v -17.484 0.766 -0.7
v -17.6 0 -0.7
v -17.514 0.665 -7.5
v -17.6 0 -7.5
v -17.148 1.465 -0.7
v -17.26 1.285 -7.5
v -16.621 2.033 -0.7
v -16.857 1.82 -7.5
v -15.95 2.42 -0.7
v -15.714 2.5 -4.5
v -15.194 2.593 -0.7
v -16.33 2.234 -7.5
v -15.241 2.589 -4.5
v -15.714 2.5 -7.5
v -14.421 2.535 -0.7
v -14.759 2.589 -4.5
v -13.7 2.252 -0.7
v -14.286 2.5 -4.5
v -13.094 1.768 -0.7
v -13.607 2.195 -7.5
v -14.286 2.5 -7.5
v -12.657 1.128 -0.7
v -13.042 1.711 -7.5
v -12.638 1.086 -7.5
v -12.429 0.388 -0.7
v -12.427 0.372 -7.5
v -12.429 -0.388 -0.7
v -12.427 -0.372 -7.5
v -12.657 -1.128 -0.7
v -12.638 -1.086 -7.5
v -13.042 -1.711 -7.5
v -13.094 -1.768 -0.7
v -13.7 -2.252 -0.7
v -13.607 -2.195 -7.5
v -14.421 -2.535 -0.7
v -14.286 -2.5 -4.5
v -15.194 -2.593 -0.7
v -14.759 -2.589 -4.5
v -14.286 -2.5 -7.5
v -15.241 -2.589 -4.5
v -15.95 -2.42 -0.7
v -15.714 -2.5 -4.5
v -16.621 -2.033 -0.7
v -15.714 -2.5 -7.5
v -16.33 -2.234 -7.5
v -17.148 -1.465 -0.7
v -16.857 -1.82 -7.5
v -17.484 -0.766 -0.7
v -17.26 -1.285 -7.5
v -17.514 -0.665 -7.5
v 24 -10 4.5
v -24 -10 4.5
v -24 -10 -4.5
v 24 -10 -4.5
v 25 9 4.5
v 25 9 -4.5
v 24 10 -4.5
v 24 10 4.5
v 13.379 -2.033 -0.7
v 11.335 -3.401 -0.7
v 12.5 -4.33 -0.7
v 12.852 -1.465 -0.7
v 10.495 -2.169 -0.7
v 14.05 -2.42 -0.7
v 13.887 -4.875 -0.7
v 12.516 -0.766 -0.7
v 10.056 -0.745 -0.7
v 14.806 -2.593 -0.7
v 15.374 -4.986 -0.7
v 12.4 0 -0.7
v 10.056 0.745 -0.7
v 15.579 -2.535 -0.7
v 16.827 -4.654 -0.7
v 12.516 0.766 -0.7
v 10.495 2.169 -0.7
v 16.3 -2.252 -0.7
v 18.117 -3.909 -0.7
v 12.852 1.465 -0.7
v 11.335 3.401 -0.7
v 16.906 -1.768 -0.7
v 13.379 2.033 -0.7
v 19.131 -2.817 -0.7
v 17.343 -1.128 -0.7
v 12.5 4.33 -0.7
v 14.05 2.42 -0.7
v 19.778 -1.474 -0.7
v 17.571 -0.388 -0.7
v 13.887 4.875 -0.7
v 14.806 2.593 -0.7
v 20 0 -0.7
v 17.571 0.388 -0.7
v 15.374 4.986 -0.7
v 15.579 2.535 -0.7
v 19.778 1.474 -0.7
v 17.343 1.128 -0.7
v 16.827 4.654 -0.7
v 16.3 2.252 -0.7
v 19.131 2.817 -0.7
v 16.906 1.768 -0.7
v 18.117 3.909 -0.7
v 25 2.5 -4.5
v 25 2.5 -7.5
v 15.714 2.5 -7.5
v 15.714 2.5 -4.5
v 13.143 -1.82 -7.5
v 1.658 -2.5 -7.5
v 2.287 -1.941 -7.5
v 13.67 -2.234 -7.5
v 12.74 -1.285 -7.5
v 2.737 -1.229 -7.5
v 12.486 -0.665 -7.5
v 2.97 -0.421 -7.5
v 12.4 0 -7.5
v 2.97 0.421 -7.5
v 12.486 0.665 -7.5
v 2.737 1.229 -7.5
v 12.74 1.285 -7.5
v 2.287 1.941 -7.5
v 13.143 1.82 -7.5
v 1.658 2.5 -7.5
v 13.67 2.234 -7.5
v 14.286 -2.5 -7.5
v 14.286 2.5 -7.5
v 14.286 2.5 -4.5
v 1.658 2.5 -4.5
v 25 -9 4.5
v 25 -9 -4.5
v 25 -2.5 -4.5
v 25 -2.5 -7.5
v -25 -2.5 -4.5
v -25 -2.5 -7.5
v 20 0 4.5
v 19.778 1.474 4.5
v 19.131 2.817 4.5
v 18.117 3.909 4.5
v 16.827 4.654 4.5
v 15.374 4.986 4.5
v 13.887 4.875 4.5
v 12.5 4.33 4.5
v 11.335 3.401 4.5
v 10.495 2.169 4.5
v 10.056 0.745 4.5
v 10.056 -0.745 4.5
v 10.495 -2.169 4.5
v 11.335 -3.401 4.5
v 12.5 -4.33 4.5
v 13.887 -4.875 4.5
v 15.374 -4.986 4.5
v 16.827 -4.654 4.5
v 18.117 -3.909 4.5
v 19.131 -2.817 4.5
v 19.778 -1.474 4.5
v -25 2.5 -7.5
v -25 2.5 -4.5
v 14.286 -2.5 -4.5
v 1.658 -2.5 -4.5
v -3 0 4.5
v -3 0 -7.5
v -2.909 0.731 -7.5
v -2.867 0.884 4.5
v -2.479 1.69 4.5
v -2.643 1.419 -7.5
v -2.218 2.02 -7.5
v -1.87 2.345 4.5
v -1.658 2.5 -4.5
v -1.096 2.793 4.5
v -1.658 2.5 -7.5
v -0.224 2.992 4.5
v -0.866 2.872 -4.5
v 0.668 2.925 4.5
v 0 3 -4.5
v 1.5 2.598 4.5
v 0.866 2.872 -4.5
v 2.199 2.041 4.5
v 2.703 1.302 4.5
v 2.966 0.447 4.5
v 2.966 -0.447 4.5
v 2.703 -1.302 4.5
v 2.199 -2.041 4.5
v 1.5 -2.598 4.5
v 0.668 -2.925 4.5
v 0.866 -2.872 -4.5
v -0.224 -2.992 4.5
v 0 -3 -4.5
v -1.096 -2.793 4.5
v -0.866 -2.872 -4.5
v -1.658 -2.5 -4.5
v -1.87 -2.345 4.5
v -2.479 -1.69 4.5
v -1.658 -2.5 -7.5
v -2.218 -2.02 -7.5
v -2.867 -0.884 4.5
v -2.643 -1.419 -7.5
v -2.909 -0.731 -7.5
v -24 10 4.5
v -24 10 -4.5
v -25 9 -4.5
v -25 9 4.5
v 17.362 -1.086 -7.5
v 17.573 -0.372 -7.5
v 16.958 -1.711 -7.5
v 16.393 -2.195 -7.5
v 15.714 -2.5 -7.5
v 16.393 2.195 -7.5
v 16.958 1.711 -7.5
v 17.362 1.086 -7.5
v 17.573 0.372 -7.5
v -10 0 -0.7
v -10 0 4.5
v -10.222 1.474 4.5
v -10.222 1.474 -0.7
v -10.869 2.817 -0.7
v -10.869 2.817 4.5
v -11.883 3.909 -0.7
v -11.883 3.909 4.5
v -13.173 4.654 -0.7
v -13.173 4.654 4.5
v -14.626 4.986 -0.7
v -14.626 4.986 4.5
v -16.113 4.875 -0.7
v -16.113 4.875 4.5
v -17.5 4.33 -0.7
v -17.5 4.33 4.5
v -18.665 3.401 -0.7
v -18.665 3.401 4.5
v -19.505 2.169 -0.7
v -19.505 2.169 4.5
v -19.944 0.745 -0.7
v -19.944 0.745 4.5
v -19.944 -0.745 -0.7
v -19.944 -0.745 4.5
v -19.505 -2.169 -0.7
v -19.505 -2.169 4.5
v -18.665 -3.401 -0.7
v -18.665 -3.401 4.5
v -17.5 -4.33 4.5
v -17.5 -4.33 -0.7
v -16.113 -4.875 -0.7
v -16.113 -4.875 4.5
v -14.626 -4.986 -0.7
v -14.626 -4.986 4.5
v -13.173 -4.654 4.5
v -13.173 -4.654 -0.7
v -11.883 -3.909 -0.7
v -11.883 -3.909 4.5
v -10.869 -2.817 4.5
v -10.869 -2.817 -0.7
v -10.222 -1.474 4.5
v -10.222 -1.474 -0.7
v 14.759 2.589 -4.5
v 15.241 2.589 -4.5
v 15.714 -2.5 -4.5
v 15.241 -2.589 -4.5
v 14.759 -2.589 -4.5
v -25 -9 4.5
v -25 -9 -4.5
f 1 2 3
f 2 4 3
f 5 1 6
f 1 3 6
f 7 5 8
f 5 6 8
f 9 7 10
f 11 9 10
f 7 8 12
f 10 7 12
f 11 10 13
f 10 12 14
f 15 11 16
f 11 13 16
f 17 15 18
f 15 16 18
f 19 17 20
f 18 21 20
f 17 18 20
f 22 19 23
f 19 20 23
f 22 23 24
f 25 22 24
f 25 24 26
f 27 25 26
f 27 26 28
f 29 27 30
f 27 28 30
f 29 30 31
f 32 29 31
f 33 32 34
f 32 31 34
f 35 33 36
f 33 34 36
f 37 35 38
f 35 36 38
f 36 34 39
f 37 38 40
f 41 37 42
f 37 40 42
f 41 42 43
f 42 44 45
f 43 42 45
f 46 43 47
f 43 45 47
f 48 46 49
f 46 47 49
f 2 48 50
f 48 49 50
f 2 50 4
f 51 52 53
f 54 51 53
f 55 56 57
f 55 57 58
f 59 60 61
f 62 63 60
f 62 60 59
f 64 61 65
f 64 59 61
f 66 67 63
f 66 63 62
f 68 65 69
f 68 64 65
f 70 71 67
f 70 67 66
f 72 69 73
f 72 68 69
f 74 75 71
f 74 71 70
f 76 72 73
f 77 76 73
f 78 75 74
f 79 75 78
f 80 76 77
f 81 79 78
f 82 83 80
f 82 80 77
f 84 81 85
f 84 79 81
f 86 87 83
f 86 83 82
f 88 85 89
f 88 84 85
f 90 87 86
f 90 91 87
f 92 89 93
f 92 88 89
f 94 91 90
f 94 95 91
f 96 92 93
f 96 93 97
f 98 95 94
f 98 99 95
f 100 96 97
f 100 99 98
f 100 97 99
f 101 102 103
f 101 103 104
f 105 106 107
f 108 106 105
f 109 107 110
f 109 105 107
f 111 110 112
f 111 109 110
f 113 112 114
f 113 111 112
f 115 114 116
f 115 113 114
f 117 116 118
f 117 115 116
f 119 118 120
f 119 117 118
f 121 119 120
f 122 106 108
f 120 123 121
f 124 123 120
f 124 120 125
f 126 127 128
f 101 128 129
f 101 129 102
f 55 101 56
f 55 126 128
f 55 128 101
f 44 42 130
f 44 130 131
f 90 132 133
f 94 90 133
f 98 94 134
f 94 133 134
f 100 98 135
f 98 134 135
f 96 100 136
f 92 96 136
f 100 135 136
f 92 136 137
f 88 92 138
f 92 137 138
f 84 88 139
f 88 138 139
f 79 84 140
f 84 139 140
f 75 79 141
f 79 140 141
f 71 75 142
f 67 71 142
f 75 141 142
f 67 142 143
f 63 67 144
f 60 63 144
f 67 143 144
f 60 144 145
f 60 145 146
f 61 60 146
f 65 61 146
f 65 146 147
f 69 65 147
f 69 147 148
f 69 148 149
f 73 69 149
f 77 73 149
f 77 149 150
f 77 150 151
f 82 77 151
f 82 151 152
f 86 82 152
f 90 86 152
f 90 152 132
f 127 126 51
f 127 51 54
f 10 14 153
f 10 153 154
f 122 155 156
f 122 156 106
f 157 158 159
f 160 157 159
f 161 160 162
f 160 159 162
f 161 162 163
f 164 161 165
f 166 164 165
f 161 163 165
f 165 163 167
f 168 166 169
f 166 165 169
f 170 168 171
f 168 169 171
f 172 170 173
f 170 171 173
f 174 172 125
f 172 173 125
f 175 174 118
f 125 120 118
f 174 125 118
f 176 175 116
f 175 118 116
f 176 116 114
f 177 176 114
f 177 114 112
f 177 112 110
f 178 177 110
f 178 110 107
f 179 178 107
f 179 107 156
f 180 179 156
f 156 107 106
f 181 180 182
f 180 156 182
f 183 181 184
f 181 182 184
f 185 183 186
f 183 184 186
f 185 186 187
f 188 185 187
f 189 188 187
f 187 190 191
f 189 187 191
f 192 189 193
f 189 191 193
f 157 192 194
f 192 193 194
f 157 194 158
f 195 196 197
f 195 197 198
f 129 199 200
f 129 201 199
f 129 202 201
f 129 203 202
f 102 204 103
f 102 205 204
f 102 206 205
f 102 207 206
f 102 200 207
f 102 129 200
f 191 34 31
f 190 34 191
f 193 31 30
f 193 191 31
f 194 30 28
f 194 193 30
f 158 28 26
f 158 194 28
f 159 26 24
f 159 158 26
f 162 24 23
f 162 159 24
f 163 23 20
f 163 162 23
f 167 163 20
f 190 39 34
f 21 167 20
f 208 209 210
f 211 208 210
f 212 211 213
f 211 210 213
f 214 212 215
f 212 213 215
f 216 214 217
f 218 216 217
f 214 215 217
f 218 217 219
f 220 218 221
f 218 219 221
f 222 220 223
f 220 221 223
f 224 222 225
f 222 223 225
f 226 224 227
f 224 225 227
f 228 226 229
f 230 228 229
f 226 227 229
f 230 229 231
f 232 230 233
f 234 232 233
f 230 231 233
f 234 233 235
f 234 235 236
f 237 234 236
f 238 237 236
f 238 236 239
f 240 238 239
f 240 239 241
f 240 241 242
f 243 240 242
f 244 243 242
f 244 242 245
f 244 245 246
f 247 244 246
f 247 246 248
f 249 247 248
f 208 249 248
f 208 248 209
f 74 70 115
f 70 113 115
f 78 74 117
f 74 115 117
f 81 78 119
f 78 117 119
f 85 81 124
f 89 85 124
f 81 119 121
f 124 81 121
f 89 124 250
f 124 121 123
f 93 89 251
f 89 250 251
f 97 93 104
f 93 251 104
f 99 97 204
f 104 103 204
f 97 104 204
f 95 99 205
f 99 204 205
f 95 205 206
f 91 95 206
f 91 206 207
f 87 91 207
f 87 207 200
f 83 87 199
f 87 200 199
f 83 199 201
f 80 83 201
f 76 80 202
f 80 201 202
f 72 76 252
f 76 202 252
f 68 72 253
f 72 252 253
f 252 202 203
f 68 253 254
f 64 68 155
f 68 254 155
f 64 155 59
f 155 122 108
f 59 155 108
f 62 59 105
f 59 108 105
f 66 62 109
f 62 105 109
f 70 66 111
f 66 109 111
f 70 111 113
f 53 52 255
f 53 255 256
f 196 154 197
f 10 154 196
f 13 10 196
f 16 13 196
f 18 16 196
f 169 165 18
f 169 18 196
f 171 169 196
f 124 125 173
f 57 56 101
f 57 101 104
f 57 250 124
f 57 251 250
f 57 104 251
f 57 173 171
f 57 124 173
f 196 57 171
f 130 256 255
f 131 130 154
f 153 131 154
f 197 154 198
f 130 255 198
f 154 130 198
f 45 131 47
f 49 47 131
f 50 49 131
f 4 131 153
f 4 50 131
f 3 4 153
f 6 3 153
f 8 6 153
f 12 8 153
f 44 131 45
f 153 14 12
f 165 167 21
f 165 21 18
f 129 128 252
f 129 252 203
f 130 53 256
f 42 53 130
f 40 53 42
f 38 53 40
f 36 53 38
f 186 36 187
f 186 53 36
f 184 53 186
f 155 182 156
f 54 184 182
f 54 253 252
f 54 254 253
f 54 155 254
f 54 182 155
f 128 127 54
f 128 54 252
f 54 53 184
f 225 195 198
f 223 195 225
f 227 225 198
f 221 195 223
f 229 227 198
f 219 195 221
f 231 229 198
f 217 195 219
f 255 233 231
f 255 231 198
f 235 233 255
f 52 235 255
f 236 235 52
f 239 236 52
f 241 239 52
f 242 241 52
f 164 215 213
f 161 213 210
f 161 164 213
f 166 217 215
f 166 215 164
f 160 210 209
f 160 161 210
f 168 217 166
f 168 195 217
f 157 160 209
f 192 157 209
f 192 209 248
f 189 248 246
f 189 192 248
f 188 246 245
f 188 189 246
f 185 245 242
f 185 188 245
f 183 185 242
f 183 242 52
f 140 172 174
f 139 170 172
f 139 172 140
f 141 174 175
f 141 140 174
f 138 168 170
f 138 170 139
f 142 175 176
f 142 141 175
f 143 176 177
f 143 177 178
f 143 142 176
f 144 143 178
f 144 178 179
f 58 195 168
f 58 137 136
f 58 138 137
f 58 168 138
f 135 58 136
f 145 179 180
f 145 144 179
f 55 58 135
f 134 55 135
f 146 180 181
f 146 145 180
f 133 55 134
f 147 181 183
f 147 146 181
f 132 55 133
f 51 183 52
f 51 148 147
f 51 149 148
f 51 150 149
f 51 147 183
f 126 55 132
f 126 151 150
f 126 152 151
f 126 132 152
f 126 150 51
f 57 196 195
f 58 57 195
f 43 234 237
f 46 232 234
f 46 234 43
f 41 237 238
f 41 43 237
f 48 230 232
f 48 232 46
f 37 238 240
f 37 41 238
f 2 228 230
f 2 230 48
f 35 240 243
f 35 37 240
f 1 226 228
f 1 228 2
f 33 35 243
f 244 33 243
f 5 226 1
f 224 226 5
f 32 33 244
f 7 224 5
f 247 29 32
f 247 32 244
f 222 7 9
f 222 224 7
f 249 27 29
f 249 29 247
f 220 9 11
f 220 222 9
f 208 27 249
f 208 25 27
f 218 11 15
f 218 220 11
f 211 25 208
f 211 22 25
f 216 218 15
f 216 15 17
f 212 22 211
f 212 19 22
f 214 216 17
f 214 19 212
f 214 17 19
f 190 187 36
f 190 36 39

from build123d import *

# Parameters (mm, degrees)
F1_DEPTH       = 25
F3_D           = 5.2
F3_CBORE_D     = 10
F3_CBORE_DEPTH = 5.2
F4_D           = 6
F5_SIZE        = 1


with BuildPart() as f1:
    # F0 (on Right) → F1 (new body, symmetric)
    with BuildSketch(Plane.YZ):
        Polygon((10, 4.5), (-10, 4.5), (-10, -4.5), (-2.5, -4.5), (-2.5, -7.5), (2.5, -7.5), (2.5, -4.5), (10, -4.5), align=None)
    extrude(amount=F1_DEPTH, both=True)

    # F3 (through all)
    with Locations(Plane.XY.offset(4.5)):
        with Locations((-15, 0), (15, 0)):
            CounterBoreHole(F3_D / 2, F3_CBORE_D / 2, F3_CBORE_DEPTH)

    # F4 (through all)
    with Locations(Plane.XY.offset(4.5)):
        with Locations((0, 0)):
            Hole(F4_D / 2)

    # F5
    f5_edges = [f1.edges().sort_by_distance(p)[0] for p in [
        (25, -10, 0),
        (25, 10, 0),
        (-25, -10, 0),
        (-25, 10, 0),
    ]]
    chamfer(f5_edges, length=F5_SIZE)


solid = f1.part
